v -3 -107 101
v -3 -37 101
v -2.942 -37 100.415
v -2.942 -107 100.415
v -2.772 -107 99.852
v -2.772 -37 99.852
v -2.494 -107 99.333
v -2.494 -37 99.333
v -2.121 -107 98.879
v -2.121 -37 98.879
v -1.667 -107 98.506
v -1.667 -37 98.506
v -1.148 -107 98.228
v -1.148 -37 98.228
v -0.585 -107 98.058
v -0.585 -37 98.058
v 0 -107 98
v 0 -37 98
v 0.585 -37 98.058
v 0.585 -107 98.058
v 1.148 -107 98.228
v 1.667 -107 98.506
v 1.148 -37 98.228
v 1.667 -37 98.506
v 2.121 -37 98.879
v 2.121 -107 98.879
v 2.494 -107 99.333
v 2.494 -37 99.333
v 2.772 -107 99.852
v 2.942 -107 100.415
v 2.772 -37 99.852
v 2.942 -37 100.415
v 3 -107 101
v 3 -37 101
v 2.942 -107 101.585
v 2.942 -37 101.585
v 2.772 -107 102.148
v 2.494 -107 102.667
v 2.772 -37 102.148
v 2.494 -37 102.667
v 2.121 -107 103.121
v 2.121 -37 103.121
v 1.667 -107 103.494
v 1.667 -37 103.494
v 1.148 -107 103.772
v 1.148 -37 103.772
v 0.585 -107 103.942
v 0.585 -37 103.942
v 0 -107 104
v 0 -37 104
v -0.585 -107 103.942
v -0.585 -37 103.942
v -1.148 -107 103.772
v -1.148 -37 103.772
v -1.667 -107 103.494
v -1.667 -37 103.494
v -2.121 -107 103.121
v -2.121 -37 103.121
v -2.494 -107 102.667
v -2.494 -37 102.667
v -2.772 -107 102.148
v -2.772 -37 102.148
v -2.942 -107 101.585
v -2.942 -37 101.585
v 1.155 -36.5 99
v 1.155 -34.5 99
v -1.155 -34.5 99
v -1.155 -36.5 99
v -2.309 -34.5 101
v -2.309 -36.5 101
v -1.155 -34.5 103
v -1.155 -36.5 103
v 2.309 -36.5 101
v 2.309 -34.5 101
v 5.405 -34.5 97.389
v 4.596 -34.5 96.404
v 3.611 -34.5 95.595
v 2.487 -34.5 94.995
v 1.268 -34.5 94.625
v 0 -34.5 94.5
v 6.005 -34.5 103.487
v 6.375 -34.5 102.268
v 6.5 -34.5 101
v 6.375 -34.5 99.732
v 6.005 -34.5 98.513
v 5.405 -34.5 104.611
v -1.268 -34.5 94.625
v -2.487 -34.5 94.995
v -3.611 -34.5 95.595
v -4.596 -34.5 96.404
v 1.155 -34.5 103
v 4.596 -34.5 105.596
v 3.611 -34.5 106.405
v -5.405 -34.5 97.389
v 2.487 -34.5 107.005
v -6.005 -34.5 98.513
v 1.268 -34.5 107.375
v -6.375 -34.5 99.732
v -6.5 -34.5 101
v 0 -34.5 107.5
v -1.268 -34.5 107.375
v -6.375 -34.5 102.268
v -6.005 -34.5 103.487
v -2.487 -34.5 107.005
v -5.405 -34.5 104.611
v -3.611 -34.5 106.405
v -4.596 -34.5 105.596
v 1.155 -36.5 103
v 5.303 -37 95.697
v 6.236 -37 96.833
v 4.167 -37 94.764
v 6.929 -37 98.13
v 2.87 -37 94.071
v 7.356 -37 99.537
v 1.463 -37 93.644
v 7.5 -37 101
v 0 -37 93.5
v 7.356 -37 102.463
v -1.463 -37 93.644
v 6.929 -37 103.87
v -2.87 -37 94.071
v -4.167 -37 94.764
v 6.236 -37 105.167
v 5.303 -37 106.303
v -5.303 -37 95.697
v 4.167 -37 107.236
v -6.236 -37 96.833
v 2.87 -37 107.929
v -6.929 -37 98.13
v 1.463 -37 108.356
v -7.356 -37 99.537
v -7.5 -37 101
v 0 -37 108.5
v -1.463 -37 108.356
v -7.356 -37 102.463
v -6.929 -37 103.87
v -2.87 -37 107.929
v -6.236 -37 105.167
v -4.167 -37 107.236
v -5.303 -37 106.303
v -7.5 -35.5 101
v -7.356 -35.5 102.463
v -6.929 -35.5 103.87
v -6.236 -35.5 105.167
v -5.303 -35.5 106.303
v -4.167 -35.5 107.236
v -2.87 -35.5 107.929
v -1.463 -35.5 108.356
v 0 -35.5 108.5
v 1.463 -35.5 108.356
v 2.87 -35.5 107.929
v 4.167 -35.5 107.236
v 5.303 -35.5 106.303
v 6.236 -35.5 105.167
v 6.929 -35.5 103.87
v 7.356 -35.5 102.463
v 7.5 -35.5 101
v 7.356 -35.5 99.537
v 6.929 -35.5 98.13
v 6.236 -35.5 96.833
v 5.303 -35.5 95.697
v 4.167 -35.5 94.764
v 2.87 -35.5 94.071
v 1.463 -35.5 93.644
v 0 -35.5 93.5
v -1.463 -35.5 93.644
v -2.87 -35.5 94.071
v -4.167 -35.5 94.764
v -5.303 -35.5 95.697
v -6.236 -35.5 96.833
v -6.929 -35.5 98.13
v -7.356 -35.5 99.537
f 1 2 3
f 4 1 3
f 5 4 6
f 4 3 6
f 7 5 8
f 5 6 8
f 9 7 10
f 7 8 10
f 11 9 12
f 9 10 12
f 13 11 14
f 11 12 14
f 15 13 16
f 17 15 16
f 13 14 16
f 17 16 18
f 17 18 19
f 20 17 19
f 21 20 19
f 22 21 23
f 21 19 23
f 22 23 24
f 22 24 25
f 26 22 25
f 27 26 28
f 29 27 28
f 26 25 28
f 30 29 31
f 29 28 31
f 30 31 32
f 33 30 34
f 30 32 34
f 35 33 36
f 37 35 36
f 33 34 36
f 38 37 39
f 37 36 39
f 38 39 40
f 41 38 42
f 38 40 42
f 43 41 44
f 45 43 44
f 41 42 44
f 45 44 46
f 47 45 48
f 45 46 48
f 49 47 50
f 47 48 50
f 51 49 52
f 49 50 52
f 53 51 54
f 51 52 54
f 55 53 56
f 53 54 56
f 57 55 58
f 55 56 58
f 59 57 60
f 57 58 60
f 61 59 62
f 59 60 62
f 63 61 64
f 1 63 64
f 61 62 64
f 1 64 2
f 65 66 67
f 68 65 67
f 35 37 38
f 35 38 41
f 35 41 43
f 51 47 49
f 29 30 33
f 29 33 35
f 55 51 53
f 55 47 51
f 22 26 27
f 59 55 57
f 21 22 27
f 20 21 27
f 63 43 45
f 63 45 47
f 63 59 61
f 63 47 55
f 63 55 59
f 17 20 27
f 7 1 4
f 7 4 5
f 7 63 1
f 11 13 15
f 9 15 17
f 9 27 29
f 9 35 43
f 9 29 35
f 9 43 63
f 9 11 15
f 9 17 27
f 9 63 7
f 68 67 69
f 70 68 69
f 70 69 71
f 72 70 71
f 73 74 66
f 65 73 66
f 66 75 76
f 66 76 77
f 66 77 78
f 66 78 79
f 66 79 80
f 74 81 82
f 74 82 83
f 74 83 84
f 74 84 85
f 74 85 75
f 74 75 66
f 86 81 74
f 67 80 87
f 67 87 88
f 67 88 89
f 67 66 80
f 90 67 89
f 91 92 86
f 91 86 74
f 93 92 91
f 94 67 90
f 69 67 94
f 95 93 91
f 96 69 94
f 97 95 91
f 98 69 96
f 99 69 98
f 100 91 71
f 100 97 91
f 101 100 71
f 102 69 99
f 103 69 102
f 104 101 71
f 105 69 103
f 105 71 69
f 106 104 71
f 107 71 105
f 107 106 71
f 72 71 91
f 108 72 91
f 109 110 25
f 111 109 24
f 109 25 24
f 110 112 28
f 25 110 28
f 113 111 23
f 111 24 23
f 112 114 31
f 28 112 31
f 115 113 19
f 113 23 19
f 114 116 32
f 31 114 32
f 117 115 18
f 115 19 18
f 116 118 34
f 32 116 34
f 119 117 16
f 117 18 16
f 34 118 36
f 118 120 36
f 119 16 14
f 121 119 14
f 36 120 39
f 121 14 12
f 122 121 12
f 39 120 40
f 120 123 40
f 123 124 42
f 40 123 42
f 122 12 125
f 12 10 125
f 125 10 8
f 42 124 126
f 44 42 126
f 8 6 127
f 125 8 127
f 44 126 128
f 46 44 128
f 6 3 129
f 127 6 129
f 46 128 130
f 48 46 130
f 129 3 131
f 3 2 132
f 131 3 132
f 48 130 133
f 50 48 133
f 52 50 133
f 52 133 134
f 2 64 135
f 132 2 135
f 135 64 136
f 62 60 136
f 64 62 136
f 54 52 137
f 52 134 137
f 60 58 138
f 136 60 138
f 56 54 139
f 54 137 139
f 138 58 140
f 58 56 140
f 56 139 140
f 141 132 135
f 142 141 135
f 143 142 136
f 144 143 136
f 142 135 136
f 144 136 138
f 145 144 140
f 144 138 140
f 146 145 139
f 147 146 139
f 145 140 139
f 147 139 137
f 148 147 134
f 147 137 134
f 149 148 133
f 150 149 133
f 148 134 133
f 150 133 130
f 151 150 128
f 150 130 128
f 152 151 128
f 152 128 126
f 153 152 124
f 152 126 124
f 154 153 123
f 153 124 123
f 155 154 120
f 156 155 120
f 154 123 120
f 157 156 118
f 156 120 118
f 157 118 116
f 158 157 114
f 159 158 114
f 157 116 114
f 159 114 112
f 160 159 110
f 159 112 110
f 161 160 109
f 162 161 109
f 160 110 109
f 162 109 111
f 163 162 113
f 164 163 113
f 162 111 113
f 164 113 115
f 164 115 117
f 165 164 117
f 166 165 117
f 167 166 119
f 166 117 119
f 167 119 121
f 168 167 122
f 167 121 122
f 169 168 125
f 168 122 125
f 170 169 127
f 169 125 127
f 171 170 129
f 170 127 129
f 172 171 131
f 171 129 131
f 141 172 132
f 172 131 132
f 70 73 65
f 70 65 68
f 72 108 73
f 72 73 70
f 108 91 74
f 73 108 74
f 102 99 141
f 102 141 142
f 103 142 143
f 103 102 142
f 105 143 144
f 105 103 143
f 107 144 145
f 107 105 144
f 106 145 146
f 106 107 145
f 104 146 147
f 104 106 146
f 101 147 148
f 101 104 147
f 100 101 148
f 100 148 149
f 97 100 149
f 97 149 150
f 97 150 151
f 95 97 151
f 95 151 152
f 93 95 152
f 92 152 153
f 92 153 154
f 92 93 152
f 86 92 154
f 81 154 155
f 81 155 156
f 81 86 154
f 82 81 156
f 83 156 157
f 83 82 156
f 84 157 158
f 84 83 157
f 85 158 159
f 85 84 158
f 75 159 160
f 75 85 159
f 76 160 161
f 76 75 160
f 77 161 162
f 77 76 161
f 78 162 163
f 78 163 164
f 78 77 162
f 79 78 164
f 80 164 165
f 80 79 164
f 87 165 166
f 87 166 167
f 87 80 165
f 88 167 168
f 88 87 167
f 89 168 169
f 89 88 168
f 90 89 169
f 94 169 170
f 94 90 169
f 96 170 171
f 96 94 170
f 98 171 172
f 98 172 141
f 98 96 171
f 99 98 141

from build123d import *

# Parameters (mm, degrees)
SKETCH090_R             = 7.5
PAD060_DEPTH            = 2.5
CHAMFER_SIZE            = 1
POCKET022_DEPTH         = 2
SKETCH092_R             = 3
PAD061_DEPTH            = 70
BODY051_PLACEMENT_ANGLE = 90
BODY052_PLACEMENT_ANGLE = 180


with BuildPart() as part:
    # Sketch090 → Pad060 (new body)
    with BuildSketch(Plane.XY):
        Circle(SKETCH090_R)
    extrude(amount=PAD060_DEPTH)

    # Chamfer
    chamfer_edges = [part.edges().sort_by_distance(p)[0] for p in [
        (-7.5, 0, 2.5),
    ]]
    chamfer(chamfer_edges, length=CHAMFER_SIZE)

    # Sketch091 (on Face4 of Chamfer) → Pocket022 (cut)
    with BuildSketch(Plane.XY.offset(2.5)):
        Polygon((1.154701, 2), (-1.154701, 2), (-2.309401, 0), (-1.154701, -2), (1.154701, -2), (2.309401, 0), align=None)
    extrude(amount=-POCKET022_DEPTH, mode=Mode.SUBTRACT)

    # Sketch092 (on Face3 of Pocket022) → Pad061 (join)
    with BuildSketch(Plane(origin=(0, 0, 0), x_dir=(1, 0, 0), z_dir=(0, 0, -1))):
        Circle(SKETCH092_R)
    extrude(amount=PAD061_DEPTH)


with BuildPart() as part_1:
    # Body051 placement: moved
    add(part.part.moved(Location((0, 37, 101))).rotate(Axis((0, 37, 101), (1, 0, 0)), BODY051_PLACEMENT_ANGLE))


with BuildPart() as part_2:
    # Body052 placement: moved
    add(part_1.part.rotate(Axis((0, 0, 0), (0, 0, 1)), BODY052_PLACEMENT_ANGLE))


solid = part_2.part
